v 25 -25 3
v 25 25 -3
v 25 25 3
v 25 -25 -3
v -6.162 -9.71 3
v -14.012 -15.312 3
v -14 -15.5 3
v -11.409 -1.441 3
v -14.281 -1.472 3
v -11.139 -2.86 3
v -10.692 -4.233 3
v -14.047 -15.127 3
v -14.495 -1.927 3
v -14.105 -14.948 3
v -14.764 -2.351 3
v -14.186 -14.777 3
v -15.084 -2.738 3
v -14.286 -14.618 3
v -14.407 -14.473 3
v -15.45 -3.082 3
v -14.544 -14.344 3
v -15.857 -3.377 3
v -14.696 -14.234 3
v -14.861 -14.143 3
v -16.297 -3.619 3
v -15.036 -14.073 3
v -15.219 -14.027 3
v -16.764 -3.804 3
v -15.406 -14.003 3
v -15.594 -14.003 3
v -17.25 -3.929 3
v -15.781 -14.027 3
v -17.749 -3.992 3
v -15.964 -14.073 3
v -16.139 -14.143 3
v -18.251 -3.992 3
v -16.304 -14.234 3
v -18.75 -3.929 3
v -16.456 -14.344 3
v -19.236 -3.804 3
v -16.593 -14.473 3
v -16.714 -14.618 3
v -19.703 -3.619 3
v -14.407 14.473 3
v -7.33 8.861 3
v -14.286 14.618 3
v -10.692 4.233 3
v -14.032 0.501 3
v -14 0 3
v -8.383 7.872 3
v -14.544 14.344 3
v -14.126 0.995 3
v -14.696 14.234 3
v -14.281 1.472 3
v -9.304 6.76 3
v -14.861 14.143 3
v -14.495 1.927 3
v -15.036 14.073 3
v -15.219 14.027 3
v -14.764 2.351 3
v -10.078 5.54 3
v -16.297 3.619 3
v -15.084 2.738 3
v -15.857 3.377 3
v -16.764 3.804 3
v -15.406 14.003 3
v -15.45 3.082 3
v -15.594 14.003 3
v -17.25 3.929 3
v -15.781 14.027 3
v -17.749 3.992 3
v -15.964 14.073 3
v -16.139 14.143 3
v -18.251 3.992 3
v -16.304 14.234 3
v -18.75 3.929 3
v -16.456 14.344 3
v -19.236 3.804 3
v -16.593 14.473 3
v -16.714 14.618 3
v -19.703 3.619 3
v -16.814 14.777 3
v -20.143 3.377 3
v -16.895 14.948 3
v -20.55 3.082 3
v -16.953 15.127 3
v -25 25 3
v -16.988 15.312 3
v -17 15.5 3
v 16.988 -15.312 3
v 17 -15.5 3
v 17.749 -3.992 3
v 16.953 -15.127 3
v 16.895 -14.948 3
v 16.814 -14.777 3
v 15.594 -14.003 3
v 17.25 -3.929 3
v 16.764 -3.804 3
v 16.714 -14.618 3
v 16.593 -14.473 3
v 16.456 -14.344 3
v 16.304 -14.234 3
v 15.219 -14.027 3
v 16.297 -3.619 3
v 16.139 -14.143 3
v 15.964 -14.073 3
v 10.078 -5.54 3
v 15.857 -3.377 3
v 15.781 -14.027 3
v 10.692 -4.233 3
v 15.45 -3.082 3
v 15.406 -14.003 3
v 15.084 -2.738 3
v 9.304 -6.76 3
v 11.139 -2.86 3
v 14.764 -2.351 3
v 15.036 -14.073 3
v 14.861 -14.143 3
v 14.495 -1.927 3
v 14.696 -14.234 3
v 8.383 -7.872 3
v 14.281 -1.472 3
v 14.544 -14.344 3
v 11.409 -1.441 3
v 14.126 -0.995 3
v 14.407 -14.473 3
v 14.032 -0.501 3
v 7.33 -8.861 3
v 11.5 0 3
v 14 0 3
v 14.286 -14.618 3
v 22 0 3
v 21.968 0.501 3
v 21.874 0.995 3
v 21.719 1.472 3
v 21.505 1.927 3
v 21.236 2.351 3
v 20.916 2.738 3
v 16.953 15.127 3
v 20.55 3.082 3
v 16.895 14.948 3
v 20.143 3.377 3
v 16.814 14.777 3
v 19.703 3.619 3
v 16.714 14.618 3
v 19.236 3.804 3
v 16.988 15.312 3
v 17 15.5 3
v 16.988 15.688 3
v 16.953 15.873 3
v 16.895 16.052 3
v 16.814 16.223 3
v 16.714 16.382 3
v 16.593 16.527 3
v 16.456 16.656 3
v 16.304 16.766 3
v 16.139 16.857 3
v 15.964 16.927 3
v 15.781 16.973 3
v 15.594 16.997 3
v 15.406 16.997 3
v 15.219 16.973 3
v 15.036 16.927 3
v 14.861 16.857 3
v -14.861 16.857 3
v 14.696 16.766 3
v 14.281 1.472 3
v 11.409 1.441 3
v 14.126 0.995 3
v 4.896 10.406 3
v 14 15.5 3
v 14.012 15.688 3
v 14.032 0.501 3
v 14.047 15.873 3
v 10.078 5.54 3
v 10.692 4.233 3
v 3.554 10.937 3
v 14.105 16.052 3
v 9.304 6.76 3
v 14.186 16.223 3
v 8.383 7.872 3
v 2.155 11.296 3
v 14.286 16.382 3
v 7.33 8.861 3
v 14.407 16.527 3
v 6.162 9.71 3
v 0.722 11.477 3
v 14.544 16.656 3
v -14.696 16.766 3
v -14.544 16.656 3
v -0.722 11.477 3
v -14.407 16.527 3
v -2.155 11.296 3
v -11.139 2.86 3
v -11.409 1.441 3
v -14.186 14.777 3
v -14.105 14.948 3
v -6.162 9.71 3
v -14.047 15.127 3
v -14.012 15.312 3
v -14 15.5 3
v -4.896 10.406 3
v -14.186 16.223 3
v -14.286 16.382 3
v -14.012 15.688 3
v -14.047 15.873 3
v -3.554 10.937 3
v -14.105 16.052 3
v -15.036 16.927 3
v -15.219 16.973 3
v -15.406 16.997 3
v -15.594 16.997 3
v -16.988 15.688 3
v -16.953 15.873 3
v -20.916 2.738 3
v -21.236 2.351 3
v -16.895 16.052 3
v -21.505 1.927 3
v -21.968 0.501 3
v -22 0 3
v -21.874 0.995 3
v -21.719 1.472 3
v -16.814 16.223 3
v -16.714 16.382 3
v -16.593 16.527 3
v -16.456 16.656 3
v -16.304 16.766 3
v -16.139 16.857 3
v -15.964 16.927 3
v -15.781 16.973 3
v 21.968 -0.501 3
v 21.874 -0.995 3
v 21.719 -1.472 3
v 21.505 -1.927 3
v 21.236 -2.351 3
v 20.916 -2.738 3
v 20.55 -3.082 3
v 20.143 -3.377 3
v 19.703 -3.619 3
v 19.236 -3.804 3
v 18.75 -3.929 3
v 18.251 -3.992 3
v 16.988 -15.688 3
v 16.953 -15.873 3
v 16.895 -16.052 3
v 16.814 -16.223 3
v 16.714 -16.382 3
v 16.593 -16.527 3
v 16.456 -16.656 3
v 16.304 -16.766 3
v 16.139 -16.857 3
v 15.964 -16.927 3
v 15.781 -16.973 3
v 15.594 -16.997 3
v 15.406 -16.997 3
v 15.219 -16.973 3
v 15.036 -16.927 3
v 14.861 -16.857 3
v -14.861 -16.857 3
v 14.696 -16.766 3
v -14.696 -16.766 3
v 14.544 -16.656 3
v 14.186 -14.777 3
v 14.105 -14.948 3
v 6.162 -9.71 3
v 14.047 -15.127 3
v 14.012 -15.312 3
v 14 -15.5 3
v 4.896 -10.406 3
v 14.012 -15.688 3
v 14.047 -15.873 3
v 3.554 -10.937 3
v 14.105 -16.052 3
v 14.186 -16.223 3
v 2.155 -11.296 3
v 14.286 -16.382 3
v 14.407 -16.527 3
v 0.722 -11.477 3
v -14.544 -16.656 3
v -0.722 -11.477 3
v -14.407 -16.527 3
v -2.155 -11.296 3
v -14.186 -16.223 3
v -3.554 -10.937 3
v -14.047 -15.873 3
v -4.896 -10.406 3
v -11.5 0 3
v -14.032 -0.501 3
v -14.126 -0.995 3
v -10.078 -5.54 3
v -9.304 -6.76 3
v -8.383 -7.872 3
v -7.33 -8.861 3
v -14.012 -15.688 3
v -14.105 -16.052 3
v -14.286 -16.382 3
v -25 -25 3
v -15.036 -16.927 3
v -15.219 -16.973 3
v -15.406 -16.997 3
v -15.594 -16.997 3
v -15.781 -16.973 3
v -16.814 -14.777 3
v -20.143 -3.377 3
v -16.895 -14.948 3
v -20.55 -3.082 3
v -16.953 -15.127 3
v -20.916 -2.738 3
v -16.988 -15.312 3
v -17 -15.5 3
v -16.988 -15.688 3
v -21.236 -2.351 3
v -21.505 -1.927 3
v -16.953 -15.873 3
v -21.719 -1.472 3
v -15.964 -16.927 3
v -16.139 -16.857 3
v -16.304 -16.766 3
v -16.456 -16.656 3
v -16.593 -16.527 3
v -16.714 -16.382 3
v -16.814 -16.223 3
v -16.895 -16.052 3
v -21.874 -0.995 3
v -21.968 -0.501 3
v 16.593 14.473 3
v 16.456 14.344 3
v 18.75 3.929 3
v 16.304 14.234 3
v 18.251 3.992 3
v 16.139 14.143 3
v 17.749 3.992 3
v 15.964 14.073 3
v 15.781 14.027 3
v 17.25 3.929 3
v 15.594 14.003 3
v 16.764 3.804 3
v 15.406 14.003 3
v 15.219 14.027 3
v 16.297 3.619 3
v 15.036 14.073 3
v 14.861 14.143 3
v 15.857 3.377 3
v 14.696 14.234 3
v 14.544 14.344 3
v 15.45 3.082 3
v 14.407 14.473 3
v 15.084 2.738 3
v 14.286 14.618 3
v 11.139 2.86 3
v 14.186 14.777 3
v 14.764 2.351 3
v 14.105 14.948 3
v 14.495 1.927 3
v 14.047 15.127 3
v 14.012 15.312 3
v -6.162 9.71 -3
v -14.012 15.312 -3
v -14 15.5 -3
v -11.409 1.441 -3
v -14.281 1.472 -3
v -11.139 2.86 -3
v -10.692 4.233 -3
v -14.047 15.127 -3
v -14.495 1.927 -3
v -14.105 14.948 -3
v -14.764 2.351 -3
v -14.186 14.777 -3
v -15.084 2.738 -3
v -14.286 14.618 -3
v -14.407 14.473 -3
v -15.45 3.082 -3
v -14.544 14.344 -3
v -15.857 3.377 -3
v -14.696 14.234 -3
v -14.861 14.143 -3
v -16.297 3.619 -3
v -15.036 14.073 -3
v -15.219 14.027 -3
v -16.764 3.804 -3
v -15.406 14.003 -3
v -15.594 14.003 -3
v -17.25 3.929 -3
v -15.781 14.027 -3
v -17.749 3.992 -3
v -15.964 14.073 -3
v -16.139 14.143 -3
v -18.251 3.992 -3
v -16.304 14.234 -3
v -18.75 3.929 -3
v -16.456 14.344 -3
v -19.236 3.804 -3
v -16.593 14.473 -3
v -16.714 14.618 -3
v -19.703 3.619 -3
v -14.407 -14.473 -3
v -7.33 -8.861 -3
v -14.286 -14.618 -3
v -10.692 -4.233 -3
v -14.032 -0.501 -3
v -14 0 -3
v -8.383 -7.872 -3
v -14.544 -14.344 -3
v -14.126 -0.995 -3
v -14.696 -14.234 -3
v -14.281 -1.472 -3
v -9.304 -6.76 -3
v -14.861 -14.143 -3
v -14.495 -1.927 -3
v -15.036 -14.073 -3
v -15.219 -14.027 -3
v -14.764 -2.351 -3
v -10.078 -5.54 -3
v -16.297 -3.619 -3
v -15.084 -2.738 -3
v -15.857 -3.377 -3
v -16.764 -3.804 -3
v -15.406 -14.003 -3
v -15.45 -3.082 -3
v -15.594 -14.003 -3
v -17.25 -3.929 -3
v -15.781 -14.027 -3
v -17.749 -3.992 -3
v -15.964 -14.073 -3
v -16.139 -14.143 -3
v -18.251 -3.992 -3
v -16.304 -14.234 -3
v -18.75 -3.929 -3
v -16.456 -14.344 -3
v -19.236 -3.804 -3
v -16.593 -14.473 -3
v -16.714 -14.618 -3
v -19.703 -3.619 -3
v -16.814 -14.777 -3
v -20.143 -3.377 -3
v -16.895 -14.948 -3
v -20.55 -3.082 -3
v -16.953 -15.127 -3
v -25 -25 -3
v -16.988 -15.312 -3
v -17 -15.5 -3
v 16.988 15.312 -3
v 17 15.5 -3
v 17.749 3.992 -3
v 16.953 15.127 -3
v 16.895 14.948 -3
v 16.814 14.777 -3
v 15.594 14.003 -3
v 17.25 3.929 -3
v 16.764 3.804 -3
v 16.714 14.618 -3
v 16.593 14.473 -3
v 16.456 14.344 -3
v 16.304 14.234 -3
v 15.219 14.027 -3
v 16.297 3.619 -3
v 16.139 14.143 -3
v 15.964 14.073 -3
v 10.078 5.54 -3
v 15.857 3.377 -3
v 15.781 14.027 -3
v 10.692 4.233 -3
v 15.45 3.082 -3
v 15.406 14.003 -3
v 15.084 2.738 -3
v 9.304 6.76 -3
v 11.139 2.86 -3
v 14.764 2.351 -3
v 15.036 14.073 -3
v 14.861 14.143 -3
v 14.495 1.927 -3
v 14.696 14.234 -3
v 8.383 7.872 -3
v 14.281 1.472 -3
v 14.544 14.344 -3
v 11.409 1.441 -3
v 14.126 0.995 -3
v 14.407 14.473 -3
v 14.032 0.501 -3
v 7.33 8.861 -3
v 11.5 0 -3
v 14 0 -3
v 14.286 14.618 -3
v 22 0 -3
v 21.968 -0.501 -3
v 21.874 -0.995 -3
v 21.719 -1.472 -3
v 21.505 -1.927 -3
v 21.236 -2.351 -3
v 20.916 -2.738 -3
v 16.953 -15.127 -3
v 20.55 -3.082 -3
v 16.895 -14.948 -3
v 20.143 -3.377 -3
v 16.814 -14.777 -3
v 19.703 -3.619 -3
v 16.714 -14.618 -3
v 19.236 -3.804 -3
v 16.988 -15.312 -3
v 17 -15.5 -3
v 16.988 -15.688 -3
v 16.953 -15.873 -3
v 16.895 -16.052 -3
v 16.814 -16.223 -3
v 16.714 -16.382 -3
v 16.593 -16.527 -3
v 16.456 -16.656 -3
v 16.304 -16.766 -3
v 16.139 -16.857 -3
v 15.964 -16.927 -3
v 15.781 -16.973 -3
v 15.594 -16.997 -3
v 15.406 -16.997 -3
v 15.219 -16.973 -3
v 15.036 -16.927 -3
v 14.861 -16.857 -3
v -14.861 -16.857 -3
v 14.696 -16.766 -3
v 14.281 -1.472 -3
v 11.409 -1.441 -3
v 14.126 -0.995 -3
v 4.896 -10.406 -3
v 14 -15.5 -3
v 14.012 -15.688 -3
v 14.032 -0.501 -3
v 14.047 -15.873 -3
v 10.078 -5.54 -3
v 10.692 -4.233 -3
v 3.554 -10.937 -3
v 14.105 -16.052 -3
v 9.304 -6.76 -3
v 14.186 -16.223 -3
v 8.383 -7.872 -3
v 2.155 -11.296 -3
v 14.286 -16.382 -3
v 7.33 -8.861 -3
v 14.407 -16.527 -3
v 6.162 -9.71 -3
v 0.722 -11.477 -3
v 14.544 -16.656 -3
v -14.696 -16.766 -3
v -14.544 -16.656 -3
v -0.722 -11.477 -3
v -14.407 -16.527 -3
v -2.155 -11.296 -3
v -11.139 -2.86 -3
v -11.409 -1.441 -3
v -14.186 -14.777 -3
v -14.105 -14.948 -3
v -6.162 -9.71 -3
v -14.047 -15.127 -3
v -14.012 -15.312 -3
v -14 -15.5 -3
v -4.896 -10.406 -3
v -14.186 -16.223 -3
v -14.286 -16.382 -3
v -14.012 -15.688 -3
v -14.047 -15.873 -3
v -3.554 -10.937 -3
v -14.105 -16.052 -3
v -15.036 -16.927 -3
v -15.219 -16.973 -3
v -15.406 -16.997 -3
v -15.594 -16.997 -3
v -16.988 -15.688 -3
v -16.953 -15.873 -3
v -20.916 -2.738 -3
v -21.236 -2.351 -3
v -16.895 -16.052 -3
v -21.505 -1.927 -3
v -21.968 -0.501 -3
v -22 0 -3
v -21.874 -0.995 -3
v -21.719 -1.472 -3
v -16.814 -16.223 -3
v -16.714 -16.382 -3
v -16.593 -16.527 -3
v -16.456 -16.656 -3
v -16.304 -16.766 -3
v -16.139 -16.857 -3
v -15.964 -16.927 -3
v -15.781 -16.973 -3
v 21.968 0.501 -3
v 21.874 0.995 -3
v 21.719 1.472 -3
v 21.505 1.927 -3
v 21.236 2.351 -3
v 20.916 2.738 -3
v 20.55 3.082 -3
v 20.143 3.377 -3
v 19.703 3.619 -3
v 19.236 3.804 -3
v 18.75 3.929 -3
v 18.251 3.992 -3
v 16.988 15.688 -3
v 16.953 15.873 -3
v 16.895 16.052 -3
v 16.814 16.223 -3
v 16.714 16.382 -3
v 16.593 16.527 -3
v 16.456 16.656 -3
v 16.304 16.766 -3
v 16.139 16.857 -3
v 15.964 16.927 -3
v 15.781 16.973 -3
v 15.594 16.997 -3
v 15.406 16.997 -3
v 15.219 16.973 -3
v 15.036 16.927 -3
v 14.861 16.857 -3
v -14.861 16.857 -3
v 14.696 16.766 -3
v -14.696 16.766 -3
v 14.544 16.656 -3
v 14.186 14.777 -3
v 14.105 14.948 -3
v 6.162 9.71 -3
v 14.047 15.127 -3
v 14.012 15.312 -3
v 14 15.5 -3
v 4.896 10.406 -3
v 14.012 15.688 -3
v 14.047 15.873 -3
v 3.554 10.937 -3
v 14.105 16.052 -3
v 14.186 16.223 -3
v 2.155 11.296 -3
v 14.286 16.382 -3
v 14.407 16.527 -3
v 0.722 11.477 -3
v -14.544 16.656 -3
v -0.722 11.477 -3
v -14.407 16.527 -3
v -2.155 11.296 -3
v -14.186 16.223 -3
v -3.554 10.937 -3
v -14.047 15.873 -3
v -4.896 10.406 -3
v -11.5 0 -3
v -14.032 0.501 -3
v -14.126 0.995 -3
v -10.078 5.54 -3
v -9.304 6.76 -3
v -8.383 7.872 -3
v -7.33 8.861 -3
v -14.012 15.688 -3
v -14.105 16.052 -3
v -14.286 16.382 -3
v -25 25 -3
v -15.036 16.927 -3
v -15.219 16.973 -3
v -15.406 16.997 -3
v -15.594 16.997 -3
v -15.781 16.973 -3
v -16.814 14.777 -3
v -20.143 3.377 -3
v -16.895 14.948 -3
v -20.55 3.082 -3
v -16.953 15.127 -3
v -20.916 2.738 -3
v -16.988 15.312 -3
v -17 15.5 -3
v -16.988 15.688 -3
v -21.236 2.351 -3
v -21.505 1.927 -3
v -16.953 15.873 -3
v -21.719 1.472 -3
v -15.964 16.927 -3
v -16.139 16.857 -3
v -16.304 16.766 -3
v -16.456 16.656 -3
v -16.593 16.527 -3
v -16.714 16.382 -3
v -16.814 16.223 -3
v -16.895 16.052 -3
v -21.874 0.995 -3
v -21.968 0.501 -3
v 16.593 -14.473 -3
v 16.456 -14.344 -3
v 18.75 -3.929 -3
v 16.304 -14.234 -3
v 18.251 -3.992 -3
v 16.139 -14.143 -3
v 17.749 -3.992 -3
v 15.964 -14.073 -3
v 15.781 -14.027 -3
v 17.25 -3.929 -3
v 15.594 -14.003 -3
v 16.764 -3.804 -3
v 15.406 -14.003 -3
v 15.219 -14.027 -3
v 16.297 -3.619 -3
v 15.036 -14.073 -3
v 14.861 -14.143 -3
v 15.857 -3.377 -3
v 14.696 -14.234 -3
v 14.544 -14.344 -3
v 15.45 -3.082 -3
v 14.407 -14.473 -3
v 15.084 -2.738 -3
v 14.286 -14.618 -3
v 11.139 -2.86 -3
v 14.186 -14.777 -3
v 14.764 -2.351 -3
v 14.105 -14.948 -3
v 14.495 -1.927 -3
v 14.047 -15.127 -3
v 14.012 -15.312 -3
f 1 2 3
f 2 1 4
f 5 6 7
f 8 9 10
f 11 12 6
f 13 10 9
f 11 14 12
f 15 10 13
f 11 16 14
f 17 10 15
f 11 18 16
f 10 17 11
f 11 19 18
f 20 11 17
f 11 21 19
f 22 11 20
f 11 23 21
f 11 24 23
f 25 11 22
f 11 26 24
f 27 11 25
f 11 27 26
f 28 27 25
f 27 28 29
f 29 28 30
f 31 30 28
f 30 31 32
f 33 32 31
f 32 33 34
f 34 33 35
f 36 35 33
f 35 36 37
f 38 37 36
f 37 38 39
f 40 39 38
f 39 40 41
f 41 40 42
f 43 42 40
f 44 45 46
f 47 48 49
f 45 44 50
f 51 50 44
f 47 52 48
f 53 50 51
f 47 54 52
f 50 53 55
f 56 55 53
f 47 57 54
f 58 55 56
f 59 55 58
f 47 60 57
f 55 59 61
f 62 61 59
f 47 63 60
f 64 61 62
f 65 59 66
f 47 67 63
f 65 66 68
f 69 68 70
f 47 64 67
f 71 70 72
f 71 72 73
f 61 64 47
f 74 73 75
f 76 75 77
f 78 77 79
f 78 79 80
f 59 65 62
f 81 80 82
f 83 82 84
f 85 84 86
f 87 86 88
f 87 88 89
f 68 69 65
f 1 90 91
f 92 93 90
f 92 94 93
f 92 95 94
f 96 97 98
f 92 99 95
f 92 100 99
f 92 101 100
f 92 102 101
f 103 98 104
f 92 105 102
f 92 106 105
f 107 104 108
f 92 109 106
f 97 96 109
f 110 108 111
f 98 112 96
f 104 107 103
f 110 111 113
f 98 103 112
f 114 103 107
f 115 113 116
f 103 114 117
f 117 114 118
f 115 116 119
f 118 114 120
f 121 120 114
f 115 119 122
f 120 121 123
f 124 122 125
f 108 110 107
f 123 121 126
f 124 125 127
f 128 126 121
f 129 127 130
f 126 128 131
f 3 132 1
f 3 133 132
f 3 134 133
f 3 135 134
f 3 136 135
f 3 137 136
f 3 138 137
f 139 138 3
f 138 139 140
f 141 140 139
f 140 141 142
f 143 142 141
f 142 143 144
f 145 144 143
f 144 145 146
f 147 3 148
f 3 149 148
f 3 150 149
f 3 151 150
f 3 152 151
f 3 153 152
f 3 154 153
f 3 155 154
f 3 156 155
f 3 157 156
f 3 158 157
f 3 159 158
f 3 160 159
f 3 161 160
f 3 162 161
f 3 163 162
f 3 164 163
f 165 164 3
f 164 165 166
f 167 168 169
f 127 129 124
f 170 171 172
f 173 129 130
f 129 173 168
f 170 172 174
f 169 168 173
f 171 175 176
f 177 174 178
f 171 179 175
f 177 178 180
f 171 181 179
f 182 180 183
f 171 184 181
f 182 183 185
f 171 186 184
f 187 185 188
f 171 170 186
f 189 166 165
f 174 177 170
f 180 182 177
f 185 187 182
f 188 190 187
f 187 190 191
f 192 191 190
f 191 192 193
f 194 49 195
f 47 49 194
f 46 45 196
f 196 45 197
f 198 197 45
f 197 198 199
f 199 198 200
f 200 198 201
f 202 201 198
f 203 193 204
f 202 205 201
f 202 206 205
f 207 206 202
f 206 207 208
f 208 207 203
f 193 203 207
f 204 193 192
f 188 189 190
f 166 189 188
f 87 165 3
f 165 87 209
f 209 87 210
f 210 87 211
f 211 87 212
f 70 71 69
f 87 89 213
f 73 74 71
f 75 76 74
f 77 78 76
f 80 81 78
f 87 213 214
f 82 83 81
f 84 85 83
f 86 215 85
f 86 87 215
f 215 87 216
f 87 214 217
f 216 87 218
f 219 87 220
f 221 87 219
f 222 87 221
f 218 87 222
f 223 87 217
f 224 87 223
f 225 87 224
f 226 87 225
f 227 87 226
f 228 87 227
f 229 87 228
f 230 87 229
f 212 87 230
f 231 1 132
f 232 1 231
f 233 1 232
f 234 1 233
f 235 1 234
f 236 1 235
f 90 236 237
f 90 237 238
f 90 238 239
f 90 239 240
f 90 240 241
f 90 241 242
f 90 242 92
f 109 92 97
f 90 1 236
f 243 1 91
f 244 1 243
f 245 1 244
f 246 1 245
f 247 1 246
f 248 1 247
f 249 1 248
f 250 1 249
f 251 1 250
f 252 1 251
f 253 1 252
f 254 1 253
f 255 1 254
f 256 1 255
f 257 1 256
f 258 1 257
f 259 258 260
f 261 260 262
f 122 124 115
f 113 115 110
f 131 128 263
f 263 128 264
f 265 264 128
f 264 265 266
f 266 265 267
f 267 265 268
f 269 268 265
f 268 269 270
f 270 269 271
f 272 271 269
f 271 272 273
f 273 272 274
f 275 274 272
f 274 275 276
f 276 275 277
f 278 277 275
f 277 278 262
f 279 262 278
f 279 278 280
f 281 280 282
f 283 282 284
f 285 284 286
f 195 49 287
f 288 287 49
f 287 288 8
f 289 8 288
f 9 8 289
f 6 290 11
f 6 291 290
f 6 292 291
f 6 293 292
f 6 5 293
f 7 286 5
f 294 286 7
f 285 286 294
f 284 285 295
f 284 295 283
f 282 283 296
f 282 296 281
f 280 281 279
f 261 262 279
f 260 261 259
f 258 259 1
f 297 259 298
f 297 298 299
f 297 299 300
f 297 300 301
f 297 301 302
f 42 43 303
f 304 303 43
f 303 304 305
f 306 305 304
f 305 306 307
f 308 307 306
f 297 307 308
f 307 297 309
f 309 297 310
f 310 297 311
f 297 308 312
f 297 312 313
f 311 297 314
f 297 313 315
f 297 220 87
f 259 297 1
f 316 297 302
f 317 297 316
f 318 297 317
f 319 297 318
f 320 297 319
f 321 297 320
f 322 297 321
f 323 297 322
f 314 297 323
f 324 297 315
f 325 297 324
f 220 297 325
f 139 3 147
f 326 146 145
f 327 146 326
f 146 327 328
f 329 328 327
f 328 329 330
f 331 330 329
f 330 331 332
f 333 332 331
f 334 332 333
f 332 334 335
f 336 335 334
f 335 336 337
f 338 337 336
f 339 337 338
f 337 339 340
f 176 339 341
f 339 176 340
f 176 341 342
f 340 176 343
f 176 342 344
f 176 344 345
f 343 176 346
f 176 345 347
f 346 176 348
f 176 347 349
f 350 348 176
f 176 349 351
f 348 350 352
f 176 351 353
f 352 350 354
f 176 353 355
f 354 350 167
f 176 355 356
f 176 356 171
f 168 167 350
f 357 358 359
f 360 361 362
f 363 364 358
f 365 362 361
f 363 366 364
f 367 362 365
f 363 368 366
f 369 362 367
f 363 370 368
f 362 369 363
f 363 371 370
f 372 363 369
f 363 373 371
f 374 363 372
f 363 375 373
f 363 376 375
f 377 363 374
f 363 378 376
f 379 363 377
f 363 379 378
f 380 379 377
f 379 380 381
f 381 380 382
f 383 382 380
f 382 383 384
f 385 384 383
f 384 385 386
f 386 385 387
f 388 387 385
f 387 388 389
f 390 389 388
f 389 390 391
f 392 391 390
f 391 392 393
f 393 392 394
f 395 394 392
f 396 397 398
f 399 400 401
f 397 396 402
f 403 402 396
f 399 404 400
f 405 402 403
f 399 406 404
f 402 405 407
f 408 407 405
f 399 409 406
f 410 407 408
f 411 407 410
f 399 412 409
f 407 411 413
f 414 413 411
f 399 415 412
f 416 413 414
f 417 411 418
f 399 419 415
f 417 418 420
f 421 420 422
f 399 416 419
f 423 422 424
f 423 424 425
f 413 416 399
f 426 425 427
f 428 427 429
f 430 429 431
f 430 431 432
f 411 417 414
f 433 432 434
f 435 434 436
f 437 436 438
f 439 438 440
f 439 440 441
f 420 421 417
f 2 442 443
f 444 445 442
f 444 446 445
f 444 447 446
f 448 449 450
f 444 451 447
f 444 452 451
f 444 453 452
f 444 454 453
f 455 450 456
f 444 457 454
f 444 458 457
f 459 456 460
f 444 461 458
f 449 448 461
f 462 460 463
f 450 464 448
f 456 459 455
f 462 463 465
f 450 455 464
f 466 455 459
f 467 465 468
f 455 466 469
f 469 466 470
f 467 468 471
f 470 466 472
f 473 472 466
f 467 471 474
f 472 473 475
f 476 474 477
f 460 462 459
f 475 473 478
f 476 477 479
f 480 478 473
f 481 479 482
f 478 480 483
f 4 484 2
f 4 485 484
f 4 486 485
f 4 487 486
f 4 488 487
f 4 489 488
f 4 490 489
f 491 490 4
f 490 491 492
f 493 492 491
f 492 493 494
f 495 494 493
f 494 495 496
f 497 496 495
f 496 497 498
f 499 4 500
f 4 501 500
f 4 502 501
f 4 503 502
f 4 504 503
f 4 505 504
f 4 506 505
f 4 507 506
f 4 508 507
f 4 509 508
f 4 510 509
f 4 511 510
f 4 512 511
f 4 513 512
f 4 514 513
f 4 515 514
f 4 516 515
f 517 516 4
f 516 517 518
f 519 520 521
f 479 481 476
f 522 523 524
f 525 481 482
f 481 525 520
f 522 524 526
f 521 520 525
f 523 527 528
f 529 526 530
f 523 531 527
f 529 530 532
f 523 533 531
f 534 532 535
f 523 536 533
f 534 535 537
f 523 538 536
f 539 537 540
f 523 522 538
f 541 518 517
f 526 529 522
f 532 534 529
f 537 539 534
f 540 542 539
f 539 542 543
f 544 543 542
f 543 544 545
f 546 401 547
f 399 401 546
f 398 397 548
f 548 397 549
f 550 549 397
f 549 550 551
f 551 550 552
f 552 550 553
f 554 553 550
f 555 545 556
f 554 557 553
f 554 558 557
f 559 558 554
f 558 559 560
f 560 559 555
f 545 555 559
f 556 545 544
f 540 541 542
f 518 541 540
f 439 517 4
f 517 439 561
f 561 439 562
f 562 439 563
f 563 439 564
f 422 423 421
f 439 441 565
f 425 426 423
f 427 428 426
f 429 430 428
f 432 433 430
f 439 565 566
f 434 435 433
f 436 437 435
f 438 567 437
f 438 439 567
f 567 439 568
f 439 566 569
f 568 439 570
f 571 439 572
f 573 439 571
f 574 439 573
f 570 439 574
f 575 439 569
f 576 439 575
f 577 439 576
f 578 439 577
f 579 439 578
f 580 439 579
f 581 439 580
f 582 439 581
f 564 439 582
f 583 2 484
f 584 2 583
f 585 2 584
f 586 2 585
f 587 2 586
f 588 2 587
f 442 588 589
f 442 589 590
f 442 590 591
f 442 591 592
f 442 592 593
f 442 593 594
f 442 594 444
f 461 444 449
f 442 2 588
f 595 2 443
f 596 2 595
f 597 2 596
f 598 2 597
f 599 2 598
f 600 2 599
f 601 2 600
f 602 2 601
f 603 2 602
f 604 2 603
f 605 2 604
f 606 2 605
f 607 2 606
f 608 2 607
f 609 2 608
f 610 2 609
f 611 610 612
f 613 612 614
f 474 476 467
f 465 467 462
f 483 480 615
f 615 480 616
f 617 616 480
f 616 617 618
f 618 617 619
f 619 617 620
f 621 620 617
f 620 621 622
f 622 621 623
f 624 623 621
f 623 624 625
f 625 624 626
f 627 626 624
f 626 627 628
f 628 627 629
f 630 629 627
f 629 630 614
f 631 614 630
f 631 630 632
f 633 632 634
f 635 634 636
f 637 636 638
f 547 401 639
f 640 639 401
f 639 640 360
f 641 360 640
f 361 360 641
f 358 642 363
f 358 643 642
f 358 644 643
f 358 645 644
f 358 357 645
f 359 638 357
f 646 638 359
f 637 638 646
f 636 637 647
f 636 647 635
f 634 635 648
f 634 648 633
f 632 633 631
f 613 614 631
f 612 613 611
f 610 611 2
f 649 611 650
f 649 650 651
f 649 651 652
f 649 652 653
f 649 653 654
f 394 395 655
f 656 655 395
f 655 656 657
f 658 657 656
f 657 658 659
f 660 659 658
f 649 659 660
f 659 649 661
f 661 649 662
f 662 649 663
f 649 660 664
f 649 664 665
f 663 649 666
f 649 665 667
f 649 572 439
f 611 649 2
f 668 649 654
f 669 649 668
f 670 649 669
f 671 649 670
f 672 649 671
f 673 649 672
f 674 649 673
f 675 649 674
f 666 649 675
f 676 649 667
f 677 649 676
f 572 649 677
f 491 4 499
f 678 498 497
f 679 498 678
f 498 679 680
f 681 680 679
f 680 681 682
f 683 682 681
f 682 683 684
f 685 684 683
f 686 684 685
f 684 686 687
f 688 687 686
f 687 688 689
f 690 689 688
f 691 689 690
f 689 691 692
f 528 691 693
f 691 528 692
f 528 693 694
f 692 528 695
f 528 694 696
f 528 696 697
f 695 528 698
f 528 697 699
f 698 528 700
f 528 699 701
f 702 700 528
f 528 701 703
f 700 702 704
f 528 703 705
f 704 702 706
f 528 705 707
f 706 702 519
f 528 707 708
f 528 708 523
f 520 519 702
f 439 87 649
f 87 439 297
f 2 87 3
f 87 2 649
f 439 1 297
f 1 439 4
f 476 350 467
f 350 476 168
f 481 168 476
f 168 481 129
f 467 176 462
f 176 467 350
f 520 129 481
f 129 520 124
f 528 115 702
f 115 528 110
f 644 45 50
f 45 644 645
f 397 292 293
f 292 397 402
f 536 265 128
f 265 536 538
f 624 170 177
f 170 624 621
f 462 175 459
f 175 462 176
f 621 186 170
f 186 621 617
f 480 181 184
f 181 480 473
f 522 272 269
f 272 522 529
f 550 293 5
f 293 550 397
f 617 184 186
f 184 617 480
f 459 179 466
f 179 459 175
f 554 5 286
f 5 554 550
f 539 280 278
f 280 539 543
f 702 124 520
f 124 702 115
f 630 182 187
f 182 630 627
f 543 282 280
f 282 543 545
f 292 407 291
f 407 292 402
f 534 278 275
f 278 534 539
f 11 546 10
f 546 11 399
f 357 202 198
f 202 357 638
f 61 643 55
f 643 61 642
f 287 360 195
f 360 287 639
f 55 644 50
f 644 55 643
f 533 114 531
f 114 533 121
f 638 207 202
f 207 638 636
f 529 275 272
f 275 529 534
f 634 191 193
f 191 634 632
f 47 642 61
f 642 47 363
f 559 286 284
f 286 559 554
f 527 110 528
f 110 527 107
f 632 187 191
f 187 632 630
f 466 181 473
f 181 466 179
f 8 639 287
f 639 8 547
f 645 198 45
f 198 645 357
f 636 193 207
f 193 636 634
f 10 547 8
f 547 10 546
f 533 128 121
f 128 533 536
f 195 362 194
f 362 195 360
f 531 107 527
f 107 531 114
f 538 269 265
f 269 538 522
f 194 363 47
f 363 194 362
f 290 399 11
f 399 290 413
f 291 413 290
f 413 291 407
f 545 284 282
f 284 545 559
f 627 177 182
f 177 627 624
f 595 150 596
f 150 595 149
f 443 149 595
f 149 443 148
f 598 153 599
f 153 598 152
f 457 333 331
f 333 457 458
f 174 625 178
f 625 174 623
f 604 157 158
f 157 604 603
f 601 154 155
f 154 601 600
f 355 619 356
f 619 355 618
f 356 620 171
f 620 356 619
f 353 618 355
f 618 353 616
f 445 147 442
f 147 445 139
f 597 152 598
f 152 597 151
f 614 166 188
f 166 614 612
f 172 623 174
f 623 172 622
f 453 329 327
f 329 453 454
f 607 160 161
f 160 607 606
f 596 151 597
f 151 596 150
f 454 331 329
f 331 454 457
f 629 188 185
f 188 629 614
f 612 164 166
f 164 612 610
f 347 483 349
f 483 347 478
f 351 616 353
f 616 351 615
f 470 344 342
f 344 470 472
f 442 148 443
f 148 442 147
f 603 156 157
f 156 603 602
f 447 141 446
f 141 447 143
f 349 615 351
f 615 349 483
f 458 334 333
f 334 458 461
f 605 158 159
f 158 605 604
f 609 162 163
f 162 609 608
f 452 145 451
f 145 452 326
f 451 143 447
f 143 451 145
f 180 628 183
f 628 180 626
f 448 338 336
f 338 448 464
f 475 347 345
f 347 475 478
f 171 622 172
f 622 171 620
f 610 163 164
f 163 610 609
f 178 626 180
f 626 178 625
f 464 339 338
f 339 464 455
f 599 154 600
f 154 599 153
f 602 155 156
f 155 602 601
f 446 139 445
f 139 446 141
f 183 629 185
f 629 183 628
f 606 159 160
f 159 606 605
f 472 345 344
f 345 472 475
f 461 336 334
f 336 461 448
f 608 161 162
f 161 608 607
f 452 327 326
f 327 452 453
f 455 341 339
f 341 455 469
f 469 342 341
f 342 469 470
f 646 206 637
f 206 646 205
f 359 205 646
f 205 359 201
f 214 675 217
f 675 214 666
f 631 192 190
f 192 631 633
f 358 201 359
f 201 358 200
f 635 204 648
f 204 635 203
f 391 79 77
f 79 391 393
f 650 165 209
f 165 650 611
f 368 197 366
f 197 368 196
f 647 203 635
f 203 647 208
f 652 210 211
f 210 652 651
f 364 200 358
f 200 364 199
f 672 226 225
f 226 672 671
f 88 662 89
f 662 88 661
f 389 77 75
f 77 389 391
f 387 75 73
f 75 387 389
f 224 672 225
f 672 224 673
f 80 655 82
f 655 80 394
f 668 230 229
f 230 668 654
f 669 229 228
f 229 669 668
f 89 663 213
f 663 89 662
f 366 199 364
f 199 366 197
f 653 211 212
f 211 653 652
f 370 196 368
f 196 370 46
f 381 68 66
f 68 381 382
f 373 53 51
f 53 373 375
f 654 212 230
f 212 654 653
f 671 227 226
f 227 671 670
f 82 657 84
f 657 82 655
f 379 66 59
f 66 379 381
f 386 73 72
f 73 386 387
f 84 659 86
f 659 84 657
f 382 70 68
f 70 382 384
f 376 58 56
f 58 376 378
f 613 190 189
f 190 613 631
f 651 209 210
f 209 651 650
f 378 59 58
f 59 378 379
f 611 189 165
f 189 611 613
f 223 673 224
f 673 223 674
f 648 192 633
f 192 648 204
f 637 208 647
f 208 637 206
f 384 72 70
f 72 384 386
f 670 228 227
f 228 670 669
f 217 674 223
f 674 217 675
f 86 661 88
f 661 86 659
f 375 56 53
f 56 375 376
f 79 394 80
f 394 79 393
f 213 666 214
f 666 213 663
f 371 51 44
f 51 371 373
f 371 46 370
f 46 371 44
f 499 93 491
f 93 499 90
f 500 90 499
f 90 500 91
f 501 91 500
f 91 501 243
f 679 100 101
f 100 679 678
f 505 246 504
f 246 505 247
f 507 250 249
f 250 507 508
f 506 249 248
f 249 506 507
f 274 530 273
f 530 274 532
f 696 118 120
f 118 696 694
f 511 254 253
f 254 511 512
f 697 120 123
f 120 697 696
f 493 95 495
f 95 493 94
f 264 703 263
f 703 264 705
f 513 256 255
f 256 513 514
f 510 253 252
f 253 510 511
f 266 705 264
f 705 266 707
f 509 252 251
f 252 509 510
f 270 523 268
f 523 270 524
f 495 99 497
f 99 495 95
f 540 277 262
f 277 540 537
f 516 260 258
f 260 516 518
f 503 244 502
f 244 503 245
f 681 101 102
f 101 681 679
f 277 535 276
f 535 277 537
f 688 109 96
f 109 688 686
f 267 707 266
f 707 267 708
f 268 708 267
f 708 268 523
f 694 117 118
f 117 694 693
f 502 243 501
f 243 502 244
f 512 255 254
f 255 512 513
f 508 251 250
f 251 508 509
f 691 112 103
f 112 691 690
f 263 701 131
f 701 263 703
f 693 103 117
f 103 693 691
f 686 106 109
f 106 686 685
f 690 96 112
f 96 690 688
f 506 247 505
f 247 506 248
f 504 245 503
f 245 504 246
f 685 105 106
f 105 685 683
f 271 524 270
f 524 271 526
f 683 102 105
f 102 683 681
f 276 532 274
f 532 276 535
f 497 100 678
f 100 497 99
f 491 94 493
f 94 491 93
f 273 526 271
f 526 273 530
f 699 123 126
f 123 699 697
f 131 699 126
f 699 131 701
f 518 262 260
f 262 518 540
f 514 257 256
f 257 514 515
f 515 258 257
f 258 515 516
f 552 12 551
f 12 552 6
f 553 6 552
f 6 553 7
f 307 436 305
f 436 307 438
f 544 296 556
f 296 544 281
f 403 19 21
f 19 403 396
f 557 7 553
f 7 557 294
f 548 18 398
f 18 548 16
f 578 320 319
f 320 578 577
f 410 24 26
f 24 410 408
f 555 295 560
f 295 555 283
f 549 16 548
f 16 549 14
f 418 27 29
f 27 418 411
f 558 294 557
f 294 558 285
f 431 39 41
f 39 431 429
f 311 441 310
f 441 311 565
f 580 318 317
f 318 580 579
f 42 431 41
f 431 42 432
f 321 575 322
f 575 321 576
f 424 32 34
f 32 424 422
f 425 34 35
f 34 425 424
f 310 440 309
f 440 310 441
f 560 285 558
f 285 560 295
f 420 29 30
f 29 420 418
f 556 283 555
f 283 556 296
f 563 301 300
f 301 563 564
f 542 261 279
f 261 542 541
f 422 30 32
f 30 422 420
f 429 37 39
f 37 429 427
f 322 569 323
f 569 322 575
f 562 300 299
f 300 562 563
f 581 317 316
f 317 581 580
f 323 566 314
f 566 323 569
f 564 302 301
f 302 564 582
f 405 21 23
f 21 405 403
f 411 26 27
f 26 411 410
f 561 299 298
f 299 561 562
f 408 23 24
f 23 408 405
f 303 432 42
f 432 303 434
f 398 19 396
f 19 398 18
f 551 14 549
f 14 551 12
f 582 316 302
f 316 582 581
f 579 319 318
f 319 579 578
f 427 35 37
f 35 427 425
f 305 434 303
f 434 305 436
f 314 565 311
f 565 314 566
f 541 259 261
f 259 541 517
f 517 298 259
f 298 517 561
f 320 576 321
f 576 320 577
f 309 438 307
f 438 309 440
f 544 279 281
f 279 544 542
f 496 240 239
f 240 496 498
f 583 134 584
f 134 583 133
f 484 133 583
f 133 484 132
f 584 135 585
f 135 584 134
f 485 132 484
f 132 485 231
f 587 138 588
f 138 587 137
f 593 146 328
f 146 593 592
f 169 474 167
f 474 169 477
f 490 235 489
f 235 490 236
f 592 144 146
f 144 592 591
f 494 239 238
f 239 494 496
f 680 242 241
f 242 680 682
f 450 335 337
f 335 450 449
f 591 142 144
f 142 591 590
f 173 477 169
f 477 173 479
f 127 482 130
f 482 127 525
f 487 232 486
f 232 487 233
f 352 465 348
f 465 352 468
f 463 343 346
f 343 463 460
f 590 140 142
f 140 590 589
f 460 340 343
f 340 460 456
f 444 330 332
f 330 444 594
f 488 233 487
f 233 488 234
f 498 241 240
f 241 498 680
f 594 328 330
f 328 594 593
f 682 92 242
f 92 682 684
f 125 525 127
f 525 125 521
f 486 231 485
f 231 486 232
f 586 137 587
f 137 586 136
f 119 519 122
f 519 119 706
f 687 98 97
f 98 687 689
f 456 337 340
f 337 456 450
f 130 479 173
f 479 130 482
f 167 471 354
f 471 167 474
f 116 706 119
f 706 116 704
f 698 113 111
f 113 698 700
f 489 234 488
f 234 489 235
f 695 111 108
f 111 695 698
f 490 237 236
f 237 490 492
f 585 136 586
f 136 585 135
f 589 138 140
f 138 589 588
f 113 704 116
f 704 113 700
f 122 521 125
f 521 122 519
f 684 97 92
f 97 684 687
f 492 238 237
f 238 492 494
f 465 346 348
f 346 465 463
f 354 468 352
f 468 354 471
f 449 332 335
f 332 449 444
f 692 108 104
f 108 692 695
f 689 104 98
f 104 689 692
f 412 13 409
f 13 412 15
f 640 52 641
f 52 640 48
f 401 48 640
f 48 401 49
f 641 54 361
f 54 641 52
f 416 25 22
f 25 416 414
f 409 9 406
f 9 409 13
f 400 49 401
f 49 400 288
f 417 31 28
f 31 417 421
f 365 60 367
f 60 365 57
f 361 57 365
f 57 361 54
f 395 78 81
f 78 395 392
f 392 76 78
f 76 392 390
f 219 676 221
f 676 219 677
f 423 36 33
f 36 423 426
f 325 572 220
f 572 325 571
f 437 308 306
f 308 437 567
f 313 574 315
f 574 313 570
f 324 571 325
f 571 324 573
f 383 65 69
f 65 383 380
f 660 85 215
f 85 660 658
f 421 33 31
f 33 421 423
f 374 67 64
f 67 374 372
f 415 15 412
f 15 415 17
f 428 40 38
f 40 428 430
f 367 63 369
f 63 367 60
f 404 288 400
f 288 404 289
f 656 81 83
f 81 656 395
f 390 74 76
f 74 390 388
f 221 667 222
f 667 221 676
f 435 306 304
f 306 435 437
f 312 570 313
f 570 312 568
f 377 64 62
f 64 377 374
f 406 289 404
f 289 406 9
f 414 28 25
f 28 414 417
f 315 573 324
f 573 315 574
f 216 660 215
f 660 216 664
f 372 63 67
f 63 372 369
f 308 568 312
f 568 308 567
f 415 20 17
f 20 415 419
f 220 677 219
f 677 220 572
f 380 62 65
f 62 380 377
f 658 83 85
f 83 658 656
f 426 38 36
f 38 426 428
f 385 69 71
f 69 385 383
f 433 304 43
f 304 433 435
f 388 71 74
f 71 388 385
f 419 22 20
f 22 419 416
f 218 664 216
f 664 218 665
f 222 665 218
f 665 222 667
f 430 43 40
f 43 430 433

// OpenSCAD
// Par X. HINAULT - Mars 2015 
// Tous droits réservés - GPL v3

// support de moteur NEMA

difference() {

	cube([50, 50,6], center=true); 

	// trou central
	cylinder(h=10, r=11.5, $fn=50, center=true);

	// 4 trous du support
	#translate([31/2,31/2,0])cylinder(h=10, r=1.5, $fn=50, center=true);
	#translate([-31/2,31/2,0])cylinder(h=10, r=1.5, $fn=50, center=true);
	#translate([31/2,-31/2,0])cylinder(h=10, r=1.5, $fn=50, center=true);
	#translate([-31/2,-31/2,0])cylinder(h=10, r=1.5, $fn=50, center=true);
	
	// trous des tiges filetées
	#translate([50/2-8/2-3,0,0])cylinder(h=10, r=4, $fn=50, center=true);
	#translate([-(50/2-8/2-3),0,0])cylinder(h=10, r=4, $fn=50, center=true);


} // fin difference 
